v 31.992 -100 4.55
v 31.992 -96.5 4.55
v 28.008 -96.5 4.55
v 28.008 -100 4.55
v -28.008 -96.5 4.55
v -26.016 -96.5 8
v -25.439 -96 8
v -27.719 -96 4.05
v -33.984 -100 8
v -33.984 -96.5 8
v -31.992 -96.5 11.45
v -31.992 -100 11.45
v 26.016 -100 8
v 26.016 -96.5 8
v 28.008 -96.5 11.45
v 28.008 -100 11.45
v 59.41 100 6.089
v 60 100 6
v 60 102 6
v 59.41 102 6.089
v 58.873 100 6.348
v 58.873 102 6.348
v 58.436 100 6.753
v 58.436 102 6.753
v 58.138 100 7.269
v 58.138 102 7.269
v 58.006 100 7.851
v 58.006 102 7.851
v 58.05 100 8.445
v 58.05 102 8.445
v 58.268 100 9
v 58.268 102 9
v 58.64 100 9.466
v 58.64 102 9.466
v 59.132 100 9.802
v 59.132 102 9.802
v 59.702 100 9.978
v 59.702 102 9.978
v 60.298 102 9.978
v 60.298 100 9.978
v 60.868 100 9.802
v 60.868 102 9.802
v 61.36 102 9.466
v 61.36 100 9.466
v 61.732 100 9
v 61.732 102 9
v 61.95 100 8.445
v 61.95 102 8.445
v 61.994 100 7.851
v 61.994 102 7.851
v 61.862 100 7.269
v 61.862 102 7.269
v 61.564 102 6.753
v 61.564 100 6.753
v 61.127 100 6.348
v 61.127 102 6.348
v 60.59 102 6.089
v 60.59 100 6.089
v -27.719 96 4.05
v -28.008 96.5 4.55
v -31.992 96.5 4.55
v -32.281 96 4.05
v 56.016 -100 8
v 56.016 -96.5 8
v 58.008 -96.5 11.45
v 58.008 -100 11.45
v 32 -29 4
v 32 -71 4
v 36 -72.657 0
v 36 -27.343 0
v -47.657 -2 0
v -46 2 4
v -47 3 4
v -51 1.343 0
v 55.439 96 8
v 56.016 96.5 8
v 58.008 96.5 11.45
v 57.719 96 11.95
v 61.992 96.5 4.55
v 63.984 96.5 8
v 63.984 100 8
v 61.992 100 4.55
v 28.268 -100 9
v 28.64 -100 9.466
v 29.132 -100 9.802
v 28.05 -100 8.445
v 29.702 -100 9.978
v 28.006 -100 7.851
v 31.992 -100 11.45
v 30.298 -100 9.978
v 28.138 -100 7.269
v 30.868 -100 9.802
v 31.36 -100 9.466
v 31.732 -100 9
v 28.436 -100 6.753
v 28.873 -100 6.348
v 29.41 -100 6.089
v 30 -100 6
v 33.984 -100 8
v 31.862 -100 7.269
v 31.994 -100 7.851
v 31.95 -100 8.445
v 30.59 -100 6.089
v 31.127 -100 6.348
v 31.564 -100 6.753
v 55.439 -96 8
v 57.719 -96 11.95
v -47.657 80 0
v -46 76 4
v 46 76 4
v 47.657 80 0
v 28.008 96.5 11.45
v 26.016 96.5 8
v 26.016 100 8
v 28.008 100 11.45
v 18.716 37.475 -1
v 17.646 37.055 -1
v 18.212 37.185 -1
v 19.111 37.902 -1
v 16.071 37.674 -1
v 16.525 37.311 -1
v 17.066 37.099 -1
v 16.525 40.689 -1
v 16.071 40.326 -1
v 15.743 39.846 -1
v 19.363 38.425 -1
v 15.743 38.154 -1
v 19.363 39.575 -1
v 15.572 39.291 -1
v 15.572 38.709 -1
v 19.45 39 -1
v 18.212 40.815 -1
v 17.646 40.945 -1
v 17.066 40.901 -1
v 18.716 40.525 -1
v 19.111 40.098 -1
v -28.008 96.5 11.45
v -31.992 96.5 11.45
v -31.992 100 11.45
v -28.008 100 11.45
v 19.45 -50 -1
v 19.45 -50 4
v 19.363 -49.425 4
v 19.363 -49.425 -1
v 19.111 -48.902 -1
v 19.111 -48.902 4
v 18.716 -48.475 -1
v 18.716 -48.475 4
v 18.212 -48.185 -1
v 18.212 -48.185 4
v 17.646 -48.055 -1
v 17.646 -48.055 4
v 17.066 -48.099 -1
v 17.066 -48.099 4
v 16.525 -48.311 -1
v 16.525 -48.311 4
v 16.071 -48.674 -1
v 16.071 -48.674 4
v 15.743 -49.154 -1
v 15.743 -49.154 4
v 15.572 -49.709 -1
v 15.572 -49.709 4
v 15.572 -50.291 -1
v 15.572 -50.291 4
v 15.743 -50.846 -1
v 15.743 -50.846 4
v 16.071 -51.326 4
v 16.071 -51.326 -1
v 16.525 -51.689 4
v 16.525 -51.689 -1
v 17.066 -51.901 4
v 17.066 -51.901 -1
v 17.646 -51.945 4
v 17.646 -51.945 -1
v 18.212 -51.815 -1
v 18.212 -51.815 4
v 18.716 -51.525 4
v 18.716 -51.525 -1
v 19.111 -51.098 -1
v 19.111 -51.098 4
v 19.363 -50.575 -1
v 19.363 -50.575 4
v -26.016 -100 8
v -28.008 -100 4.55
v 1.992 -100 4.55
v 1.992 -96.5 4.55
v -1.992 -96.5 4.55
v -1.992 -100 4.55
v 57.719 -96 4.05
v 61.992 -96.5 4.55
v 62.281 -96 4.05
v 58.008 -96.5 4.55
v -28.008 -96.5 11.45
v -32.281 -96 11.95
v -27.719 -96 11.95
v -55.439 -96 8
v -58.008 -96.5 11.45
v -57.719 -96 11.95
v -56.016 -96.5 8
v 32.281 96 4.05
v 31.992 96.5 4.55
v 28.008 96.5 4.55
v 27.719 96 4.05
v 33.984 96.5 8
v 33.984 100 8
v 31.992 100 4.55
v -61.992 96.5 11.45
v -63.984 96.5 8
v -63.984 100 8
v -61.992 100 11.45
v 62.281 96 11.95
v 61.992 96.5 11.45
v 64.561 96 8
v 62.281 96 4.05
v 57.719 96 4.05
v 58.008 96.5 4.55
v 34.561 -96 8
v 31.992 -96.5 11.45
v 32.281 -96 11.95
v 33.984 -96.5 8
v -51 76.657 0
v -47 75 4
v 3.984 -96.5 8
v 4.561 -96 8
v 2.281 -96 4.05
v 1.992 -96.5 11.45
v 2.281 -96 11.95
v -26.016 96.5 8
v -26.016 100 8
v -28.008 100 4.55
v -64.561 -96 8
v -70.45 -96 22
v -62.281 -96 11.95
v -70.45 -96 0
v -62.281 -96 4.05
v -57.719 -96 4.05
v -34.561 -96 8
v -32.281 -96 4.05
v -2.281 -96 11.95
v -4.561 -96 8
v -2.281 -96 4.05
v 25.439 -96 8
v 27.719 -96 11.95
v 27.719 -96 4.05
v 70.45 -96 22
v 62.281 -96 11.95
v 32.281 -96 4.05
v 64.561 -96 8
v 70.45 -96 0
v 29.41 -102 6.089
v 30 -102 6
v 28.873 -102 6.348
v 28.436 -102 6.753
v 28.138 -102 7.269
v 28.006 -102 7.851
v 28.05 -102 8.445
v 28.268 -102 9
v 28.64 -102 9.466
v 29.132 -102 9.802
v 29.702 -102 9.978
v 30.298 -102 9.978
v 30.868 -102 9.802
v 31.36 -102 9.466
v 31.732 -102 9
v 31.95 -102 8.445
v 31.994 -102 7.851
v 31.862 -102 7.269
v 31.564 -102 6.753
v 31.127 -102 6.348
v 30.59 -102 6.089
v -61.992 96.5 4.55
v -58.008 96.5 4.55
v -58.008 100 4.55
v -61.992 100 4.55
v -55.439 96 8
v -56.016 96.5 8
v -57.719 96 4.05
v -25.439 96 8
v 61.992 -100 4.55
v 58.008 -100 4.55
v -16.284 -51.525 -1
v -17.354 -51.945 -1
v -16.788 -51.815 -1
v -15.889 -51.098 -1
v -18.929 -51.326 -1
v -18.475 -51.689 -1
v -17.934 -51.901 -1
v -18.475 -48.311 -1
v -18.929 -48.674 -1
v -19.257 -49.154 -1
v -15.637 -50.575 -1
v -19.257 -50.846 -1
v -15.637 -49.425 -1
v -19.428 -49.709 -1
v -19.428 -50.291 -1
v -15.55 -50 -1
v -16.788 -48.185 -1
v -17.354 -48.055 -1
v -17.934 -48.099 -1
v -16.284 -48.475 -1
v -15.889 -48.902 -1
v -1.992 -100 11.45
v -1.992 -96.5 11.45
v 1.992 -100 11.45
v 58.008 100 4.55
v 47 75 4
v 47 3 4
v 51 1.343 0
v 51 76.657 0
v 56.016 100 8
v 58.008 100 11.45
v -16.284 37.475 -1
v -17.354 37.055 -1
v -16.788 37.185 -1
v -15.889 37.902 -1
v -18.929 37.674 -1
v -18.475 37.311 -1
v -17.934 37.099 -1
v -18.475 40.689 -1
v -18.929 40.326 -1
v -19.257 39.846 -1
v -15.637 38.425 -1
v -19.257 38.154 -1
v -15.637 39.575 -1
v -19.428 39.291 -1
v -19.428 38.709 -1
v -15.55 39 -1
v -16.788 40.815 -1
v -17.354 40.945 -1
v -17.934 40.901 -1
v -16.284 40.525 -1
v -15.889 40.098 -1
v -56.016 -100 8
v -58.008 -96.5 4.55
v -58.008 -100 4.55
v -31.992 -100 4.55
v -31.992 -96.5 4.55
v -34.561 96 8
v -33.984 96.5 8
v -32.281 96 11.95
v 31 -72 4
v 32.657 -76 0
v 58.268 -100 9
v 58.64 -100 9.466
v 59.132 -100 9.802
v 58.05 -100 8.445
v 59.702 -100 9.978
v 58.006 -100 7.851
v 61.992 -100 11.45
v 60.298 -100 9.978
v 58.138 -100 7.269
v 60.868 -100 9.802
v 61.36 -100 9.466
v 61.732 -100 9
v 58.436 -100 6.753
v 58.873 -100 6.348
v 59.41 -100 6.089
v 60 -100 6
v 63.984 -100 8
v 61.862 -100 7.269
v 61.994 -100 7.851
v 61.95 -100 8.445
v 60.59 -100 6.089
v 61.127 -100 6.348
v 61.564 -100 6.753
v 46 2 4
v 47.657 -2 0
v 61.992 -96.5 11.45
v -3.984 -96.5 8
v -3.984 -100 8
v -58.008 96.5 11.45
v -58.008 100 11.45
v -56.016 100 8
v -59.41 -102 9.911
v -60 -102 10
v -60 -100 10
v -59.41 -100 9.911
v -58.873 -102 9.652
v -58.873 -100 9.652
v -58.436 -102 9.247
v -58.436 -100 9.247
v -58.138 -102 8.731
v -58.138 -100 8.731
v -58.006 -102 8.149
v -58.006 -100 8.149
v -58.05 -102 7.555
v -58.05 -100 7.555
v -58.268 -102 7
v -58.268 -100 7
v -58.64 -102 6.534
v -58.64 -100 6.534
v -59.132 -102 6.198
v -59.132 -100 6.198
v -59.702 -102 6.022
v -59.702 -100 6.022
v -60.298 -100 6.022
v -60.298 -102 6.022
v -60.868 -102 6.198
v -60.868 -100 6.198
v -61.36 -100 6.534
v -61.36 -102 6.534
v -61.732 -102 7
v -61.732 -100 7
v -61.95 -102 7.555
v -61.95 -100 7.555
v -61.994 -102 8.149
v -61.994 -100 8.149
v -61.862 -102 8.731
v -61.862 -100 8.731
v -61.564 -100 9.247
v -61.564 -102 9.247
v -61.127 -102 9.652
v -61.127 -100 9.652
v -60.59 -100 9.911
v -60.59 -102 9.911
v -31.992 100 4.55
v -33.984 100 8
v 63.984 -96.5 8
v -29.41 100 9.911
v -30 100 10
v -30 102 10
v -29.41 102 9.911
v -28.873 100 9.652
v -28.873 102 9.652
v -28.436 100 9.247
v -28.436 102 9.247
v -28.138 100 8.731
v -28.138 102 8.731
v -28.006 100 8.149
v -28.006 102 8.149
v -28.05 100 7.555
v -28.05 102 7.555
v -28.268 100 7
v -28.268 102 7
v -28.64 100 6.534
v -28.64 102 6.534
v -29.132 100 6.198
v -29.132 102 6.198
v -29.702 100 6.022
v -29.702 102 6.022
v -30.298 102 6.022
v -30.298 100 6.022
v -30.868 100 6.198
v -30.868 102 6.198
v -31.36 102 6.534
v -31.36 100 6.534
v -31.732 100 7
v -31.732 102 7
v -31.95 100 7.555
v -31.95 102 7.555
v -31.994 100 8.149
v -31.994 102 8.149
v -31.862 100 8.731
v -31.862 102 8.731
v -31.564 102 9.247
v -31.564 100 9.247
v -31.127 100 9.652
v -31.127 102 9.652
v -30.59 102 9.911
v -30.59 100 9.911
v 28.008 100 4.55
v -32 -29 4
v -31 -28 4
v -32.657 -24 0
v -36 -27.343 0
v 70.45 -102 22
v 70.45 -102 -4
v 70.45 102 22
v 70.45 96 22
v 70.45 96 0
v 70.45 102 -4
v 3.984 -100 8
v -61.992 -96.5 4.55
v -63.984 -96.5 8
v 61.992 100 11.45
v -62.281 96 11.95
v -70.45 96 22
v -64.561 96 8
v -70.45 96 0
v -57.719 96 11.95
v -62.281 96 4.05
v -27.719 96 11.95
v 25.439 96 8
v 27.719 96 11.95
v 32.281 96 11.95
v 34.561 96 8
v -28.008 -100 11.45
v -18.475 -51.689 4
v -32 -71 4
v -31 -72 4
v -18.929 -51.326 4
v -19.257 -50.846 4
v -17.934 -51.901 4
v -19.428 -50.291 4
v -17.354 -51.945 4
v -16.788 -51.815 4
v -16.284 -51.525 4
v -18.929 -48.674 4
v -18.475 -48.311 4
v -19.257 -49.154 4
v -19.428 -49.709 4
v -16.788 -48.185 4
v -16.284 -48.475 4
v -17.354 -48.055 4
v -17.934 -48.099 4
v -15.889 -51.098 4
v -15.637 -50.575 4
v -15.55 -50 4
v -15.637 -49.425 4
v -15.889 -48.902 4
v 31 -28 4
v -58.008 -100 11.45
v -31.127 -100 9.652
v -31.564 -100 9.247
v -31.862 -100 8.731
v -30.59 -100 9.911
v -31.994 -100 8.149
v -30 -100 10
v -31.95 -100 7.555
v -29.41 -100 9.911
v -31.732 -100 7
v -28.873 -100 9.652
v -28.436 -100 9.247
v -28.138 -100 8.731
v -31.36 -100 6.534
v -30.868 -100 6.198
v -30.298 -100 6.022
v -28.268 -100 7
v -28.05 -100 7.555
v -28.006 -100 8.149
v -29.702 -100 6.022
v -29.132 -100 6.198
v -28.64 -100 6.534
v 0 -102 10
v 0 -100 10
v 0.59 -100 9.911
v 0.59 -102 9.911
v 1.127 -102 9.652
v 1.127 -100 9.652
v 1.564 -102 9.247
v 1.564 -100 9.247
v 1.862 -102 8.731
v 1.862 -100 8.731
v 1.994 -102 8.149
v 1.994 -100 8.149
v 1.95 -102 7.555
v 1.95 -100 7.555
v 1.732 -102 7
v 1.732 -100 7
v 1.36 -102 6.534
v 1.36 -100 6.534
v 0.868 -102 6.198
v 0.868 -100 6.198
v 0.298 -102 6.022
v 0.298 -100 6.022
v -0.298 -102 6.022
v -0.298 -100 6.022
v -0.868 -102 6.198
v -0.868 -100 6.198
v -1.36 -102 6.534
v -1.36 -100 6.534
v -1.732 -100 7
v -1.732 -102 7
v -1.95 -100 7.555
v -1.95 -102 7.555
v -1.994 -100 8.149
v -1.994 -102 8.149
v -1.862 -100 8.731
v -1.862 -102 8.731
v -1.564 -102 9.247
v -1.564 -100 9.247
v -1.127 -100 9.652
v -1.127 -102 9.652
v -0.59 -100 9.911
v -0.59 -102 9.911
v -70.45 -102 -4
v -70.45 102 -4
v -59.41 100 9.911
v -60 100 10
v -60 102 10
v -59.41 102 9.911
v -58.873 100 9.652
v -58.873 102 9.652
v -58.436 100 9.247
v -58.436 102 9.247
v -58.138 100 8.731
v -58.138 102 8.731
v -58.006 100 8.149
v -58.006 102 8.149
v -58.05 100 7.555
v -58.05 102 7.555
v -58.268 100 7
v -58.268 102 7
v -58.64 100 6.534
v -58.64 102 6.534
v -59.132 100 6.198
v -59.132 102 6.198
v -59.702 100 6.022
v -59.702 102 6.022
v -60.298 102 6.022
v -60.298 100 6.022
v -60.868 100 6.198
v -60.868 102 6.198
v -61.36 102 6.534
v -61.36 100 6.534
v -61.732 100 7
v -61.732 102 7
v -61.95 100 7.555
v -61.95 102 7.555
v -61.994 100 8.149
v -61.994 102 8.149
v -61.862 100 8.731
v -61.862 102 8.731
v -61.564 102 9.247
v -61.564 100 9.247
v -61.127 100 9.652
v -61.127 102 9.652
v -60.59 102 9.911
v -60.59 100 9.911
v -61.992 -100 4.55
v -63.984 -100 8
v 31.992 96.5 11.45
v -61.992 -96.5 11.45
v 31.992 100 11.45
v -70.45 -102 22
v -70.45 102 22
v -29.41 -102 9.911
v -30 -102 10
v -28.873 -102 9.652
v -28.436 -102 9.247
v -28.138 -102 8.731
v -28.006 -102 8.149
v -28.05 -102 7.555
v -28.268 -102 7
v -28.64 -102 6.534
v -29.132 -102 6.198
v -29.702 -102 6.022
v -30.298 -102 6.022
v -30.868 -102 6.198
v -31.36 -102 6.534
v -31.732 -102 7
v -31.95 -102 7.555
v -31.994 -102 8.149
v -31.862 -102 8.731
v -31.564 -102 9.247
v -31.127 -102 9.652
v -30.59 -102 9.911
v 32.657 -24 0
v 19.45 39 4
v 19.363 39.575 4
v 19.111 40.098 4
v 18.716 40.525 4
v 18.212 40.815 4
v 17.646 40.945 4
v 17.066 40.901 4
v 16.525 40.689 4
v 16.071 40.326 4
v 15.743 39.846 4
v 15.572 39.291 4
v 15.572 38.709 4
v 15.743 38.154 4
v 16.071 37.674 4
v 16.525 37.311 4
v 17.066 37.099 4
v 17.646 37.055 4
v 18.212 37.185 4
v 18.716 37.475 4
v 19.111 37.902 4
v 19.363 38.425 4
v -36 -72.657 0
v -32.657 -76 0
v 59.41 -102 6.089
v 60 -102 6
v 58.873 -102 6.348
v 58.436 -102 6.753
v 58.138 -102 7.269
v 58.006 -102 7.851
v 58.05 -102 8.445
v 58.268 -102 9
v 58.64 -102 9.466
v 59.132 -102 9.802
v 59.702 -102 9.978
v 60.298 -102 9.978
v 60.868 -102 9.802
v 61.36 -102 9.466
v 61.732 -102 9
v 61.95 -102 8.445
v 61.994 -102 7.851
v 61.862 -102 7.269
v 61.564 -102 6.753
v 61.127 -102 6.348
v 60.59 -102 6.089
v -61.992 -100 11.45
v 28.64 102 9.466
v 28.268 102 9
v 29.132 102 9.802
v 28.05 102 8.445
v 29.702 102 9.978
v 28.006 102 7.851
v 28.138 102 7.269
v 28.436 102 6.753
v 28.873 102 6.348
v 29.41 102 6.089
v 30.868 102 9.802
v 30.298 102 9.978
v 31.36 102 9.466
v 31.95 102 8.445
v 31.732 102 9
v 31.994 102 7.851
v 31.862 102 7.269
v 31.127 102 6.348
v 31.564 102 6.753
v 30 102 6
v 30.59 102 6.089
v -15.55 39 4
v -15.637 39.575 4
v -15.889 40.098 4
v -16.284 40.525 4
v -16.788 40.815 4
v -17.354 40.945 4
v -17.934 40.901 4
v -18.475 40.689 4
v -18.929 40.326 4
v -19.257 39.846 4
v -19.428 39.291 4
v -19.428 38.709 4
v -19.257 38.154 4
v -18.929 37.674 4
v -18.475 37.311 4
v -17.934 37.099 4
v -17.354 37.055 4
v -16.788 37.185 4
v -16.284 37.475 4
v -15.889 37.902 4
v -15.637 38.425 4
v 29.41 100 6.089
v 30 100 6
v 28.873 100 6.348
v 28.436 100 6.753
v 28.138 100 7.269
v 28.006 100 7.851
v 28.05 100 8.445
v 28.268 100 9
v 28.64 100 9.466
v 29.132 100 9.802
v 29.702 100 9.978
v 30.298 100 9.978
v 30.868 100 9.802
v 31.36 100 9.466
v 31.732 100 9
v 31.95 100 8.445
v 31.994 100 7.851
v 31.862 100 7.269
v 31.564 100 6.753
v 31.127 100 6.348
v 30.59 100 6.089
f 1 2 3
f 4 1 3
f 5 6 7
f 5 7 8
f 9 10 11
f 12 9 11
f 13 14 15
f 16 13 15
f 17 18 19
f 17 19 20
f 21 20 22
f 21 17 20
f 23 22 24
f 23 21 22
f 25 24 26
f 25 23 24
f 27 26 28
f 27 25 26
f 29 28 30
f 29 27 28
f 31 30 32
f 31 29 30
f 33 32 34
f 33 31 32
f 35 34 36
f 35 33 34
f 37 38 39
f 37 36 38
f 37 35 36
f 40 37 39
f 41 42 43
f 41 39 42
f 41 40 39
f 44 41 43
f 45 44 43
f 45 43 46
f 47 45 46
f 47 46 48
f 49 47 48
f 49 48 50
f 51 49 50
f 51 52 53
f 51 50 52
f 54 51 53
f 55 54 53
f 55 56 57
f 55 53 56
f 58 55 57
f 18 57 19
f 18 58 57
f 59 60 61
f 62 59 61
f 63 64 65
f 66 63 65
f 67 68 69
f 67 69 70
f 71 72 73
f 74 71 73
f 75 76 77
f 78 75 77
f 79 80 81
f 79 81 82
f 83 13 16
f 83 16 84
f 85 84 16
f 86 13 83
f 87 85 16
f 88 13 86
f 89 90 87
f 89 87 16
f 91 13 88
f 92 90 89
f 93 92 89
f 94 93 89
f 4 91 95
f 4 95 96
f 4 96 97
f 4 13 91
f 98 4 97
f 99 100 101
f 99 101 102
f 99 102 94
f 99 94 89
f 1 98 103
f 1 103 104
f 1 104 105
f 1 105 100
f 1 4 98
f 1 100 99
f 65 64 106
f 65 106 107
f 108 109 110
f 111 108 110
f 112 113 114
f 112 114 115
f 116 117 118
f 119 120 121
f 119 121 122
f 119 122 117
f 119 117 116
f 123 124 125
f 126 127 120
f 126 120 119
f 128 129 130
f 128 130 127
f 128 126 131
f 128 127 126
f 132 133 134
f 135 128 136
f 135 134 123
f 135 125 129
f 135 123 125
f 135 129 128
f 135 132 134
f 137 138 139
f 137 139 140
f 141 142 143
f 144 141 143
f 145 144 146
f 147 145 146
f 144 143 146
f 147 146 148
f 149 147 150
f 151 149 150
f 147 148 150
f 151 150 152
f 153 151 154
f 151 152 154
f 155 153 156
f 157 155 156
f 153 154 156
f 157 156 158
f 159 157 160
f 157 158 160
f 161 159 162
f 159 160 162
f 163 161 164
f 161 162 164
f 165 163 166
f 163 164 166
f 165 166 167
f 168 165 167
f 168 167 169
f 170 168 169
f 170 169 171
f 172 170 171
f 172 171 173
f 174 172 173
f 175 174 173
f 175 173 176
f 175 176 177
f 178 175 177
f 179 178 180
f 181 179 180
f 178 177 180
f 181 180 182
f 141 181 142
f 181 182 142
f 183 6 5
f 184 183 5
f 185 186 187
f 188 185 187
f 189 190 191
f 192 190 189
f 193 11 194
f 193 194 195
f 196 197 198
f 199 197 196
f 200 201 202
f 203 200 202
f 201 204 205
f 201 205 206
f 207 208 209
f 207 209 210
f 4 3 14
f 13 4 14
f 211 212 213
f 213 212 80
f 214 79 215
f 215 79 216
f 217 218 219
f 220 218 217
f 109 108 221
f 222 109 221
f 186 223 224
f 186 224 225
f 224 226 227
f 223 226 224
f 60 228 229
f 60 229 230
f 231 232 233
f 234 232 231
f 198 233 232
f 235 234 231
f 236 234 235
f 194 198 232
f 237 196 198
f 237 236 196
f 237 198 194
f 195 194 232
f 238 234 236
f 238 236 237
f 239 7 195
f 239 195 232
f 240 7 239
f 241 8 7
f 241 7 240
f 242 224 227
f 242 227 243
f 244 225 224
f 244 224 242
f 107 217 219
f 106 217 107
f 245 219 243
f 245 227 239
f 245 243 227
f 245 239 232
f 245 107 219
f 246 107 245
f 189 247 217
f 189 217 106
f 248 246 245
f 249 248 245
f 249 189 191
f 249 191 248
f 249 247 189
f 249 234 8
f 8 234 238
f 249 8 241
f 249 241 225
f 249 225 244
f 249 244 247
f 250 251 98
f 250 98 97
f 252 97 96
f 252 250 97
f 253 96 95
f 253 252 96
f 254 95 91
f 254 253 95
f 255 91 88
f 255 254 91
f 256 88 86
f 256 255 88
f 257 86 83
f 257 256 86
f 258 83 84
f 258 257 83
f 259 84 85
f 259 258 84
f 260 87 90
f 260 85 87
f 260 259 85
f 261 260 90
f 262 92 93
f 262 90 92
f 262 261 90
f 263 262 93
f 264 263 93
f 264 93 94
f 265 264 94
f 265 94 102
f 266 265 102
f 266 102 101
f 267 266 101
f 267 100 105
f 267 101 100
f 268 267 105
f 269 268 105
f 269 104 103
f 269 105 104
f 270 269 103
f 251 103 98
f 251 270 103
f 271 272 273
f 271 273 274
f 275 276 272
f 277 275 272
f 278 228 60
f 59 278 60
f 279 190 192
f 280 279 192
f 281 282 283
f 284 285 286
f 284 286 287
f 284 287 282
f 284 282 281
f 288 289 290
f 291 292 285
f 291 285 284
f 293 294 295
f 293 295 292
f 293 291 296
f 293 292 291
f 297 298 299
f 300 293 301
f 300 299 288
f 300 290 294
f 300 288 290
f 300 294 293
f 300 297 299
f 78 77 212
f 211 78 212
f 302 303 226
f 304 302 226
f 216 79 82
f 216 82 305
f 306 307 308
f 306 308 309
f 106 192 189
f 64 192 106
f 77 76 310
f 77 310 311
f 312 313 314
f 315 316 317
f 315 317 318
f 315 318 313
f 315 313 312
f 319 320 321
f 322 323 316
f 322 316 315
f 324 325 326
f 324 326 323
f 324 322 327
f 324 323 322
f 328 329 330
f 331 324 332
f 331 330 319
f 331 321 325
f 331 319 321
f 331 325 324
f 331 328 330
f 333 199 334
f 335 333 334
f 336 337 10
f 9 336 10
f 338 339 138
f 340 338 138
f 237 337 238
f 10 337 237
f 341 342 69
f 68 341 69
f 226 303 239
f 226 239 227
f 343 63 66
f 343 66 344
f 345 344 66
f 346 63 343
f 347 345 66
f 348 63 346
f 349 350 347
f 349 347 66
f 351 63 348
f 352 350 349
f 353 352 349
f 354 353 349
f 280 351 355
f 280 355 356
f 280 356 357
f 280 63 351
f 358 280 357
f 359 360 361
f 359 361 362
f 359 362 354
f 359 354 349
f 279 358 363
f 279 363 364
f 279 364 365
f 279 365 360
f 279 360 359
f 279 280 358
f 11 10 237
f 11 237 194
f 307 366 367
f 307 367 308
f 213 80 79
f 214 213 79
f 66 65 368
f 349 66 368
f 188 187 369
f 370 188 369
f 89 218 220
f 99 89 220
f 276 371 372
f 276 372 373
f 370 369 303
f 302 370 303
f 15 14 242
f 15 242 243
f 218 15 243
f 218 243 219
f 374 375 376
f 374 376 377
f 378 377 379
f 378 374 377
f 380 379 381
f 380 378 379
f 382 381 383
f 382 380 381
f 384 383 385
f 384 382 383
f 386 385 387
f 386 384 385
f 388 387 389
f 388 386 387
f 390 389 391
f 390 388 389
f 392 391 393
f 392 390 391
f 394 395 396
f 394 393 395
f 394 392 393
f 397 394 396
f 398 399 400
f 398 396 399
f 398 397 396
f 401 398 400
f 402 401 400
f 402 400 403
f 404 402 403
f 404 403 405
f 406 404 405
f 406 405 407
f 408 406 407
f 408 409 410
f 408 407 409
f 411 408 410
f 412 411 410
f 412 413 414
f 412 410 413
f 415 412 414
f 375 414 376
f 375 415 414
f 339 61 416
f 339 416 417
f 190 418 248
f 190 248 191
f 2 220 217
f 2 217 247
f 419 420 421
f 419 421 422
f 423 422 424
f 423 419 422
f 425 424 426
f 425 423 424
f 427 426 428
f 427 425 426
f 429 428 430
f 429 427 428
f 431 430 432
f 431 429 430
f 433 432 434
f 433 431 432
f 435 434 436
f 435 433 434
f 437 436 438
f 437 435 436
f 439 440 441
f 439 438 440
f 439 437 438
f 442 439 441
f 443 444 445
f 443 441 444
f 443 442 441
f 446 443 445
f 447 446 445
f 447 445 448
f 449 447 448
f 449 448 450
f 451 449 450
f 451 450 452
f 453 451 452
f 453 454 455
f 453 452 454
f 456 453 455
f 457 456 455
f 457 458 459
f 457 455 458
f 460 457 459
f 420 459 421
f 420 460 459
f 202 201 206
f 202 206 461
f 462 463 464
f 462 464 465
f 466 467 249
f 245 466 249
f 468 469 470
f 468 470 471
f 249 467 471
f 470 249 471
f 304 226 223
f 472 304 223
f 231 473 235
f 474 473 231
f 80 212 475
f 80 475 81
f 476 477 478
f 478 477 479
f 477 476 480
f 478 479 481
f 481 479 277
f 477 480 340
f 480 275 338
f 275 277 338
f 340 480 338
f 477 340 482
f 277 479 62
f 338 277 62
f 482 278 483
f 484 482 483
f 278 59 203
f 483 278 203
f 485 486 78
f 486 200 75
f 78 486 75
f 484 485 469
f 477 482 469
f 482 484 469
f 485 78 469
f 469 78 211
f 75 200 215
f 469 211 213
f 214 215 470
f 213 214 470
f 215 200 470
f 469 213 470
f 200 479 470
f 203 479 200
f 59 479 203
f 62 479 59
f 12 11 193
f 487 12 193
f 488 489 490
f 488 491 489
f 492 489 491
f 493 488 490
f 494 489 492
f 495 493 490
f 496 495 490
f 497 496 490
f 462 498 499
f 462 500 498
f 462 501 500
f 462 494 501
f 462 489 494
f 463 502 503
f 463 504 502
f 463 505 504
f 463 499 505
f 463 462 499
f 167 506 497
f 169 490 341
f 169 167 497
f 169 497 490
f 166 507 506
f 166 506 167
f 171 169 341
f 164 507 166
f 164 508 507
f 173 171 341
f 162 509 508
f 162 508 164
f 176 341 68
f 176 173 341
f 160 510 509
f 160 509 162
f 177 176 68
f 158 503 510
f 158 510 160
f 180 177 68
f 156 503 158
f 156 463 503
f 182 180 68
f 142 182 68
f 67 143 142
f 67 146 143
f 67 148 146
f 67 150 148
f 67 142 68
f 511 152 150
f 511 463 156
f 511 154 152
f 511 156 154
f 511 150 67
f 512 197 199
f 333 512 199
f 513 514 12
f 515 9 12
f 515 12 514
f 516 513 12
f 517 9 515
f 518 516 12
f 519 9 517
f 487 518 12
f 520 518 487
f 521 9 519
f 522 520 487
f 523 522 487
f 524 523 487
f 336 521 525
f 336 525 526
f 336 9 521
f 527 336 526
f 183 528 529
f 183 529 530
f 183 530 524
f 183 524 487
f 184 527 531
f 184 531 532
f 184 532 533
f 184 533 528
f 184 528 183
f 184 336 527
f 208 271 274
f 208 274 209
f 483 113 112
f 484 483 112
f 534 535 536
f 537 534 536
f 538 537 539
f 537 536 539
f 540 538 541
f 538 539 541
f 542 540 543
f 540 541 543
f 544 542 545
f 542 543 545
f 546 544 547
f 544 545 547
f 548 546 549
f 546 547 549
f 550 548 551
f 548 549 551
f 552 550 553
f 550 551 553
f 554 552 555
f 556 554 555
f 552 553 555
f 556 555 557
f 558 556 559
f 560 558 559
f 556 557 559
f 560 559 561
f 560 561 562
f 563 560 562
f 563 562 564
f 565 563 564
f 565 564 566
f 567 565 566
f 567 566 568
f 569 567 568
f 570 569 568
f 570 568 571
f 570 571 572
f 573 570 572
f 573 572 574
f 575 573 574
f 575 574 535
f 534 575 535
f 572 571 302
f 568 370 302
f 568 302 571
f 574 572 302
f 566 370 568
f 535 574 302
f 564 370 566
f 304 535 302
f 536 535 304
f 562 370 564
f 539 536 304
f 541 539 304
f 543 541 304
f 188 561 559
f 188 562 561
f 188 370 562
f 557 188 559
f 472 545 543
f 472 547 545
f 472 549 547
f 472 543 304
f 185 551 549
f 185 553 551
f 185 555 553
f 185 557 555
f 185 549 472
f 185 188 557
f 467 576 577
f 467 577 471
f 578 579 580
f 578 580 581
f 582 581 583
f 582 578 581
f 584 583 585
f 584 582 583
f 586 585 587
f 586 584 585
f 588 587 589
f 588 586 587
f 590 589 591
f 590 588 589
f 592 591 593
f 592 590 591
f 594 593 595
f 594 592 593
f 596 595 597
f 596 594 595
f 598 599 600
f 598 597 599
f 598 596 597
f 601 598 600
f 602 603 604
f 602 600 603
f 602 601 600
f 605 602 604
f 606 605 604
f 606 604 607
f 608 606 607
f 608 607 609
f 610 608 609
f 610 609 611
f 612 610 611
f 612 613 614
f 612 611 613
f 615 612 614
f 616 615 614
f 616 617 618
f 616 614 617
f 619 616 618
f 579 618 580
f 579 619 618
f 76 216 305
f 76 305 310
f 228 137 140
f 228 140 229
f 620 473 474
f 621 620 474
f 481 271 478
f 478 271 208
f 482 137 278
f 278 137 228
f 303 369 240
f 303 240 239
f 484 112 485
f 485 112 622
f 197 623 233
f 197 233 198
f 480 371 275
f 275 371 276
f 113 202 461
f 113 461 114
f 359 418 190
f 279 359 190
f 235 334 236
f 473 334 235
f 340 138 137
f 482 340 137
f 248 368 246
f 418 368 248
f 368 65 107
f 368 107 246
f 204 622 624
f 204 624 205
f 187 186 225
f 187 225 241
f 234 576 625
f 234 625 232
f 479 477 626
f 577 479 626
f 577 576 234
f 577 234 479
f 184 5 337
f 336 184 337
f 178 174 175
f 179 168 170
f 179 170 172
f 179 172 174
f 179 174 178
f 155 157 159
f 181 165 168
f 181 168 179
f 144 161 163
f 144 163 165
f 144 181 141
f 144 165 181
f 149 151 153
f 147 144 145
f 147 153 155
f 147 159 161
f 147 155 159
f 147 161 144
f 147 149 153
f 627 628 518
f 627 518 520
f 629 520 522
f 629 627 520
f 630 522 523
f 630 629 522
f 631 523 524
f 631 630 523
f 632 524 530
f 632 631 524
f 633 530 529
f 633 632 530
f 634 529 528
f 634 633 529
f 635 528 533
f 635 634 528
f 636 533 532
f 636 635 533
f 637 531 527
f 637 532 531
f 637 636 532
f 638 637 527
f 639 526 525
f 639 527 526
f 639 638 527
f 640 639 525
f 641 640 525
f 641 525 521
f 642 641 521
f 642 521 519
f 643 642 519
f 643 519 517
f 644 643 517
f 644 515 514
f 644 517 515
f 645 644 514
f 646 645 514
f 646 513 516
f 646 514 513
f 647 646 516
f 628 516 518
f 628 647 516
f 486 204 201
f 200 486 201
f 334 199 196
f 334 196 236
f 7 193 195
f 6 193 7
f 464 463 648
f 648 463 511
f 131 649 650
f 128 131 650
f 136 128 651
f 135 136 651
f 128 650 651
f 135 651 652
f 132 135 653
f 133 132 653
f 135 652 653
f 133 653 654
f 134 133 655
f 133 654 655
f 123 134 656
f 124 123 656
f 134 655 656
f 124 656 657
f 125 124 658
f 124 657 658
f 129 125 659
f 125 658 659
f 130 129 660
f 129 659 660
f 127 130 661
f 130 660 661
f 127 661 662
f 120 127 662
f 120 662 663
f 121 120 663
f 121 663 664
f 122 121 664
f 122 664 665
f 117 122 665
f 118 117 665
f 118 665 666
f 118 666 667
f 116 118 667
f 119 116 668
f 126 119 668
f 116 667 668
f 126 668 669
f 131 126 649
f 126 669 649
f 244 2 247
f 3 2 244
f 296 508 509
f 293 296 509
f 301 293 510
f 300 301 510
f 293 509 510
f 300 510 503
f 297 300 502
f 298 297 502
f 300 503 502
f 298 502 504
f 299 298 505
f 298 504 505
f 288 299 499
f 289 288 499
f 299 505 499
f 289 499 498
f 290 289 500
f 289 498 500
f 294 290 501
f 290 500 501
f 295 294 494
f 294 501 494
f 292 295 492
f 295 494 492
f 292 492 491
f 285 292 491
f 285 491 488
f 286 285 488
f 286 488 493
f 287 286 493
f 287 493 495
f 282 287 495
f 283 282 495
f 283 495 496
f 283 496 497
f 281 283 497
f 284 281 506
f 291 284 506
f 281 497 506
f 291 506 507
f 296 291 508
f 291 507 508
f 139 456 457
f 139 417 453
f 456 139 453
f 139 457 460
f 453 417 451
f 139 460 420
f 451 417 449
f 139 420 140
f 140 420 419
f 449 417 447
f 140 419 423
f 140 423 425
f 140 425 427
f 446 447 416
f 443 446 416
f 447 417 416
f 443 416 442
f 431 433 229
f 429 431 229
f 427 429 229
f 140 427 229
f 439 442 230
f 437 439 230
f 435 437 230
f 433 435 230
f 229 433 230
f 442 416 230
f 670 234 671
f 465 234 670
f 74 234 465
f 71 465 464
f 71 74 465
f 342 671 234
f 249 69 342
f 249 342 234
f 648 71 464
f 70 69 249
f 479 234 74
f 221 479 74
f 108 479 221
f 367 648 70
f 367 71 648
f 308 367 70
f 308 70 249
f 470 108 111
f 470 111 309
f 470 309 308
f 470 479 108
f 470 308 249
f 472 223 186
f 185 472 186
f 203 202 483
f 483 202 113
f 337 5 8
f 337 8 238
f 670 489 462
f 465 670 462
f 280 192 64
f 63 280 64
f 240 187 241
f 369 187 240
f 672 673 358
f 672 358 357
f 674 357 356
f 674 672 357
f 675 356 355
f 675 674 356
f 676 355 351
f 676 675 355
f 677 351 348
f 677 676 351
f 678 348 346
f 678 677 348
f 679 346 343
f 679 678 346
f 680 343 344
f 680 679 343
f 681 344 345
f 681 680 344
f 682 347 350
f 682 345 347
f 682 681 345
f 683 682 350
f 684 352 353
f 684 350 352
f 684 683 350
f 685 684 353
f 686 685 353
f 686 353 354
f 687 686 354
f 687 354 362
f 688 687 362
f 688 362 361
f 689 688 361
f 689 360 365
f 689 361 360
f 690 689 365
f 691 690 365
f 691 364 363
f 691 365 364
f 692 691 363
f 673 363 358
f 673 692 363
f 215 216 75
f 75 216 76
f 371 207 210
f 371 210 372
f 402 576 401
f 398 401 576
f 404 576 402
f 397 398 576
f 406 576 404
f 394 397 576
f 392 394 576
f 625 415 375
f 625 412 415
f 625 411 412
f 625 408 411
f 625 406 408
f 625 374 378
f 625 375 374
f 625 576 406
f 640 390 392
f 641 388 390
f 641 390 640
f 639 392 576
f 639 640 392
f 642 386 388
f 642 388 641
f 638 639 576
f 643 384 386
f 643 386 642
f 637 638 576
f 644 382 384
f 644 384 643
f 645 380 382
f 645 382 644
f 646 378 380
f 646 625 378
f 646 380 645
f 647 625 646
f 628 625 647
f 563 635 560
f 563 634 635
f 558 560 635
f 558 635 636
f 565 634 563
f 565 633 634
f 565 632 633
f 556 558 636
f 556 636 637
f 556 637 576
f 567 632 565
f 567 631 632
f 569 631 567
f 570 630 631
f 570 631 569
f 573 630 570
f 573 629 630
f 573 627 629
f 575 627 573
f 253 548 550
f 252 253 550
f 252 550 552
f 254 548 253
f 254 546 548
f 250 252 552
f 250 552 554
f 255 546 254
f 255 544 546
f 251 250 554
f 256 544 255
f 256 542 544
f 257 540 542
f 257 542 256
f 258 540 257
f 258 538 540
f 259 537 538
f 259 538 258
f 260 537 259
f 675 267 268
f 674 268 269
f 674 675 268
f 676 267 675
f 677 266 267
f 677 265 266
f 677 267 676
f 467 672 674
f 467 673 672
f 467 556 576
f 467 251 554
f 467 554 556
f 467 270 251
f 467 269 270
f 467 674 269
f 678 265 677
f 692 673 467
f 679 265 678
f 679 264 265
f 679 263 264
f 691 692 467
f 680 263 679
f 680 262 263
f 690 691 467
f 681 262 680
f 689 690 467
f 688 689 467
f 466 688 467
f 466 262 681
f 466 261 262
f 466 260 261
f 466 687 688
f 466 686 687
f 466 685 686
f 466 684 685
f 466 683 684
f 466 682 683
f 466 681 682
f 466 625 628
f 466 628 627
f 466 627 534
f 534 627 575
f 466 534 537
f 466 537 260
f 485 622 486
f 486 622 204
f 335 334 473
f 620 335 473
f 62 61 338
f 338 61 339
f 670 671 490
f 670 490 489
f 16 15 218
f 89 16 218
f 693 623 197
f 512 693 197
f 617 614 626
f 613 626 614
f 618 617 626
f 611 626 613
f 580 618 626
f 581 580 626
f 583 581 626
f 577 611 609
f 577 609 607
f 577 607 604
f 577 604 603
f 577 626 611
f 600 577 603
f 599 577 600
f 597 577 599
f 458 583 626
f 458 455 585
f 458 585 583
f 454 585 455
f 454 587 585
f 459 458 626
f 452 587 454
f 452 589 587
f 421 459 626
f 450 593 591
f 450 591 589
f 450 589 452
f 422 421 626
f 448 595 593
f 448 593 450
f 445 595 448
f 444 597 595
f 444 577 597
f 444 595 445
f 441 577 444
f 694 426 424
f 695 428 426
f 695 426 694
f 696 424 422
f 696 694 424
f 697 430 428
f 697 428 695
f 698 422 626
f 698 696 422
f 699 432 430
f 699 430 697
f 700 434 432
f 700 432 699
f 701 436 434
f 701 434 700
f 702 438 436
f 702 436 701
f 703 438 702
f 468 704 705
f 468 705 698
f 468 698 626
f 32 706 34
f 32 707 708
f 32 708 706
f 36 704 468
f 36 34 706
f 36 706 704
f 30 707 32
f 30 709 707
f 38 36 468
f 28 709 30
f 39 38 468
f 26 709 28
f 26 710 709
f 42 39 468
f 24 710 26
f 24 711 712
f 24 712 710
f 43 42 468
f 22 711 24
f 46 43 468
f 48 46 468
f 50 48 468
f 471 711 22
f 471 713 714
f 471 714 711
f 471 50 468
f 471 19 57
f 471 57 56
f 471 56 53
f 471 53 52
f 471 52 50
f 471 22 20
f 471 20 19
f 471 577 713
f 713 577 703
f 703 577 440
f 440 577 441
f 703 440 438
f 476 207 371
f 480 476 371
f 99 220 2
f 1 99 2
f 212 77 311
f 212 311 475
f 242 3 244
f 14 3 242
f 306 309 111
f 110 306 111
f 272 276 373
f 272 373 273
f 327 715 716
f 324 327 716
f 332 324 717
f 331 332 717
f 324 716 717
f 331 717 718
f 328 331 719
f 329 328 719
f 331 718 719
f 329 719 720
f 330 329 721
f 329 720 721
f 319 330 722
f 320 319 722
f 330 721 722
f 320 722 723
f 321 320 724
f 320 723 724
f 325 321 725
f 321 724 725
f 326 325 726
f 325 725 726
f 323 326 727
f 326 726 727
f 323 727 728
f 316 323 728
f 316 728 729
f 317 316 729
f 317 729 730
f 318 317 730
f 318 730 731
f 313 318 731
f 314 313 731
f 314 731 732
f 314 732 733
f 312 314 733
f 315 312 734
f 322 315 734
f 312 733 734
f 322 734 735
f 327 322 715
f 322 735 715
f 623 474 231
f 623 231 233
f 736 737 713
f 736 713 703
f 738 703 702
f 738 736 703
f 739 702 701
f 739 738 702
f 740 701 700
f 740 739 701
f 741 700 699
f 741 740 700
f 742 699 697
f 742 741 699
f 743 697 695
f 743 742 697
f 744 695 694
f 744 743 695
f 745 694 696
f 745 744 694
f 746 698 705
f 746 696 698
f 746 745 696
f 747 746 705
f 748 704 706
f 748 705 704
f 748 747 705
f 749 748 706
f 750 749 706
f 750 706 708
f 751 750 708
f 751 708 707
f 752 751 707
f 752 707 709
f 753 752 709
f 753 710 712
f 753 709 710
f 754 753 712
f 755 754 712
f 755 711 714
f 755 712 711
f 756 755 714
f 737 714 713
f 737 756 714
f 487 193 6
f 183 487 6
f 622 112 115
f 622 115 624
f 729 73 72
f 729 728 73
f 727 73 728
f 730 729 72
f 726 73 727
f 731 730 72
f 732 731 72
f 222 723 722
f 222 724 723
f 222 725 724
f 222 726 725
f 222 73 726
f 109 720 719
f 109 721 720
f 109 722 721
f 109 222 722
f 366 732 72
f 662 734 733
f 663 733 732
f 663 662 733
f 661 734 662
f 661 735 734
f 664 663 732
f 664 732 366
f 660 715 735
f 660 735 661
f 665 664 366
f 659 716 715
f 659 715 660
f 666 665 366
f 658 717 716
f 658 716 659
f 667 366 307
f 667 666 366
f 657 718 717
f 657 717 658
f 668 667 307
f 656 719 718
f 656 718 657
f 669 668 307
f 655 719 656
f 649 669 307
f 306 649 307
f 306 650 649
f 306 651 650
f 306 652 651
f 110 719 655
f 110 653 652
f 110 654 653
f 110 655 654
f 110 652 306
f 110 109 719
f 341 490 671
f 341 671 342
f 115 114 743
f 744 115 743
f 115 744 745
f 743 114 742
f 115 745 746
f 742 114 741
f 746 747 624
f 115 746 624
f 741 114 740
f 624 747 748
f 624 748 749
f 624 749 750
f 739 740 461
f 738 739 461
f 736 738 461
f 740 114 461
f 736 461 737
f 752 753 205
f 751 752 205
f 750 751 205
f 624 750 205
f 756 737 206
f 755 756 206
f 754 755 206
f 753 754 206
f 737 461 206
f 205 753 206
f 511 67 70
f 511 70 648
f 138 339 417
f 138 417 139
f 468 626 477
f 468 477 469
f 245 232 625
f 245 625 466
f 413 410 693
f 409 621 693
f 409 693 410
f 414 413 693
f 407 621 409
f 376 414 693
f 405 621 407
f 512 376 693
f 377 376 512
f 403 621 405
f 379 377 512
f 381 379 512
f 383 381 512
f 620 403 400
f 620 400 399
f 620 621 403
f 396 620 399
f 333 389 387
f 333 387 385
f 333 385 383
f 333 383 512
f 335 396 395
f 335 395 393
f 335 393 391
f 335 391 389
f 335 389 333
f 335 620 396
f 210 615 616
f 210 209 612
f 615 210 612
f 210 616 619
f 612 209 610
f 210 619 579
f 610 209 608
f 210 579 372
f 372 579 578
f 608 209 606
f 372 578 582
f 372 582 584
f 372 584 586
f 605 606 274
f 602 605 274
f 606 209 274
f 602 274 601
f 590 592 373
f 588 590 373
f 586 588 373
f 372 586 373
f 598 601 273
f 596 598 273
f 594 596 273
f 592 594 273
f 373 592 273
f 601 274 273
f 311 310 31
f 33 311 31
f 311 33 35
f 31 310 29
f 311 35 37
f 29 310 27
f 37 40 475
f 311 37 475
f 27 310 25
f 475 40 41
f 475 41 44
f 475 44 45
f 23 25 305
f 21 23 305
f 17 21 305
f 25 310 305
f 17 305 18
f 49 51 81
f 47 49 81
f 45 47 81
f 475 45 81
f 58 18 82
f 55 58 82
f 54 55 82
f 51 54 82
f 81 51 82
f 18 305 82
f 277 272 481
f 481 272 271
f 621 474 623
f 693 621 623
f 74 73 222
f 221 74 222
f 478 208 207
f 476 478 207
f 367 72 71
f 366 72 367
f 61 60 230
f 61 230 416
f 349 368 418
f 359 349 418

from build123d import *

# Parameters (mm, degrees)
SKETCH1_W               = 140.9
SKETCH1_H               = 204
BOSS_EXTRUDE1_DEPTH     = 4
SKETCH4_W               = 140.9
SKETCH4_H               = 6
BOSS_EXTRUDE3_DEPTH     = 22
CUT_EXTRUDE1_DEPTH      = 217.940550612
CUT_EXTRUDE1_DEPTH_BACK = 217.940550612
SKETCH5_R               = 2
CUT_EXTRUDE4_DEPTH      = 4
SKETCH9_R               = 2
CUT_EXTRUDE5_DEPTH      = 212.308311479
CUT_EXTRUDE6_DEPTH      = 4
CHAMFER1_SIZE           = 0.5
SKETCH11_W              = 64
SKETCH11_H              = 44
SKETCH11_W_2            = 94
SKETCH11_H_2            = 74
BOSS_EXTRUDE4_DEPTH     = 4
CHAMFER2_SIZE           = 1
CHAMFER3_SIZE           = 4
SKETCH12_R              = 1.95
CUT_EXTRUDE7_DEPTH      = 5


with BuildPart() as part:
    # Sketch1 → Boss-Extrude1 (new body)
    with BuildSketch(Plane.XY):
        Rectangle(SKETCH1_W, SKETCH1_H)
    extrude(amount=-BOSS_EXTRUDE1_DEPTH)

    # Sketch4 → Boss-Extrude3 (add)
    with BuildSketch(Plane.XY):
        with Locations((0, 99)):
            Rectangle(SKETCH4_W, SKETCH4_H)
        with Locations((0, -99)):
            Rectangle(SKETCH4_W, SKETCH4_H)
    extrude(amount=BOSS_EXTRUDE3_DEPTH)

    # Sketch5 → Cut-Extrude1 (cut, two sides: drawn at the far end of the back side and taken through both)
    with BuildSketch(Plane(origin=(0, 102, 0), x_dir=(1, 0, 0), z_dir=(0, 1, 0)).offset(-CUT_EXTRUDE1_DEPTH_BACK)):
        with Locations(Location((-30, -8, 0), (0, 0, 270))):
            Circle(SKETCH5_R)
        with Locations(Location((-60, -8, 0), (0, 0, 270))):
            Circle(SKETCH5_R)
        with Locations(Location((60, -8, 0), (0, 0, 90))):
            Circle(SKETCH5_R)
        with Locations(Location((30, -8, 0), (0, 0, 90))):
            Circle(SKETCH5_R)
    extrude(amount=CUT_EXTRUDE1_DEPTH + CUT_EXTRUDE1_DEPTH_BACK, mode=Mode.SUBTRACT)

    # Sketch8 → Cut-Extrude4 (cut)
    with BuildSketch(Plane(origin=(0, -96, 0), x_dir=(1, 0, 0), z_dir=(0, 1, 0))):
        Polygon((-26.016283143, -8), (-28.008141571, -4.55), (-31.991858429, -4.55), (-33.983716857, -8), (-31.991858429, -11.45), (-28.008141571, -11.45), align=None)
        Polygon((-56.016283143, -8), (-58.008141571, -4.55), (-61.991858429, -4.55), (-63.983716857, -8), (-61.991858429, -11.45), (-58.008141571, -11.45), align=None)
        Polygon((33.983716857, -8), (31.991858429, -4.55), (28.008141571, -4.55), (26.016283143, -8), (28.008141571, -11.45), (31.991858429, -11.45), align=None)
        Polygon((63.983716857, -8), (61.991858429, -4.55), (58.008141571, -4.55), (56.016283143, -8), (58.008141571, -11.45), (61.991858429, -11.45), align=None)
    cut_extrude4 = extrude(amount=-CUT_EXTRUDE4_DEPTH, mode=Mode.SUBTRACT)

    # Mirror1: Cut-Extrude4 across plane
    add(cut_extrude4.mirror(Plane.ZX), mode=Mode.SUBTRACT)

    # Sketch9 → Cut-Extrude5 (cut, through all)
    with BuildSketch(Plane(origin=(0, -96, 0), x_dir=(1, 0, 0), z_dir=(0, 1, 0))):
        with Locations(Location((0, -8, 0), (0, 0, 270))):
            Circle(SKETCH9_R)
    extrude(amount=-CUT_EXTRUDE5_DEPTH, mode=Mode.SUBTRACT)

    # Sketch10 → Cut-Extrude6 (cut)
    with BuildSketch(Plane(origin=(0, -96, 0), x_dir=(1, 0, 0), z_dir=(0, 1, 0))):
        Polygon((1.991858429, -4.55), (-1.991858429, -4.55), (-3.983716857, -8), (-1.991858429, -11.45), (1.991858429, -11.45), (3.983716857, -8), align=None)
    extrude(amount=-CUT_EXTRUDE6_DEPTH, mode=Mode.SUBTRACT)

    # Chamfer1
    chamfer1_edges = [part.edges().sort_by_distance(p)[0] for p in [
        (32.987787643, -96, 9.725),
        (32.987787643, -96, 6.275),
        (30, -96, 4.55),
        (27.012212357, -96, 6.275),
        (27.012212357, -96, 9.725),
        (30, -96, 11.45),
        (62.987787643, -96, 9.725),
        (62.987787643, -96, 6.275),
        (60, -96, 4.55),
        (57.012212357, -96, 6.275),
        (57.012212357, -96, 9.725),
        (60, -96, 11.45),
        (-57.012212357, 96, 9.725),
        (-57.012212357, 96, 6.275),
        (-60, 96, 4.55),
        (-62.987787643, 96, 6.275),
        (-62.987787643, 96, 9.725),
        (-60, 96, 11.45),
        (-27.012212357, 96, 9.725),
        (-27.012212357, 96, 6.275),
        (-30, 96, 4.55),
        (-32.987787643, 96, 6.275),
        (-32.987787643, 96, 9.725),
        (-30, 96, 11.45),
        (32.987787643, 96, 9.725),
        (32.987787643, 96, 6.275),
        (30, 96, 4.55),
        (27.012212357, 96, 6.275),
        (27.012212357, 96, 9.725),
        (30, 96, 11.45),
        (62.987787643, 96, 9.725),
        (62.987787643, 96, 6.275),
        (60, 96, 4.55),
        (57.012212357, 96, 6.275),
        (57.012212357, 96, 9.725),
        (60, 96, 11.45),
        (2.987787643, -96, 6.275),
        (0, -96, 4.55),
        (-2.987787643, -96, 6.275),
        (-2.987787643, -96, 9.725),
        (0, -96, 11.45),
        (2.987787643, -96, 9.725),
        (-57.012212357, -96, 9.725),
        (-57.012212357, -96, 6.275),
        (-60, -96, 4.55),
        (-62.987787643, -96, 6.275),
        (-62.987787643, -96, 9.725),
        (-60, -96, 11.45),
        (-27.012212357, -96, 9.725),
        (-27.012212357, -96, 6.275),
        (-30, -96, 4.55),
        (-32.987787643, -96, 6.275),
        (-32.987787643, -96, 9.725),
        (-30, -96, 11.45),
    ]]
    chamfer(chamfer1_edges, length=CHAMFER1_SIZE)

    # Sketch11 → Boss-Extrude4 (add)
    with BuildSketch(Plane.XY):
        with Locations((0, -50)):
            Rectangle(SKETCH11_W, SKETCH11_H)
        with Locations((0, 39)):
            Rectangle(SKETCH11_W_2, SKETCH11_H_2)
    extrude(amount=BOSS_EXTRUDE4_DEPTH)

    # Chamfer2
    chamfer2_edges = [part.edges().sort_by_distance(p)[0] for p in [
        (-32, -28, 2),
        (-32, -72, 2),
        (32, -72, 2),
        (32, -28, 2),
        (-47, 76, 2),
        (-47, 2, 2),
        (47, 2, 2),
        (47, 76, 2),
    ]]
    chamfer(chamfer2_edges, length=CHAMFER2_SIZE)

    # Chamfer3
    chamfer3_edges = [part.edges().sort_by_distance(p)[0] for p in [
        (-46.5, 2.5, 0),
        (0, 2, 0),
        (46.5, 2.5, 0),
        (47, 39, 0),
        (46.5, 75.5, 0),
        (0, 76, 0),
        (-46.5, 75.5, 0),
        (-47, 39, 0),
        (-31.5, -71.5, 0),
        (0, -72, 0),
        (31.5, -71.5, 0),
        (32, -50, 0),
        (31.5, -28.5, 0),
        (0, -28, 0),
        (-31.5, -28.5, 0),
        (-32, -50, 0),
    ]]
    chamfer(chamfer3_edges, length=CHAMFER3_SIZE - 0.0001)  # a hair under: the kernel refuses the full size

    # Sketch12 → Cut-Extrude7 (cut)
    with BuildSketch(Plane.XY.offset(4)):
        with Locations((-17.5, 39)):
            Circle(SKETCH12_R)
        with Locations((17.5, 39)):
            Circle(SKETCH12_R)
        with Locations((-17.5, -50)):
            Circle(SKETCH12_R)
        with Locations((17.5, -50)):
            Circle(SKETCH12_R)
    extrude(amount=-CUT_EXTRUDE7_DEPTH, mode=Mode.SUBTRACT)


solid = part.part
